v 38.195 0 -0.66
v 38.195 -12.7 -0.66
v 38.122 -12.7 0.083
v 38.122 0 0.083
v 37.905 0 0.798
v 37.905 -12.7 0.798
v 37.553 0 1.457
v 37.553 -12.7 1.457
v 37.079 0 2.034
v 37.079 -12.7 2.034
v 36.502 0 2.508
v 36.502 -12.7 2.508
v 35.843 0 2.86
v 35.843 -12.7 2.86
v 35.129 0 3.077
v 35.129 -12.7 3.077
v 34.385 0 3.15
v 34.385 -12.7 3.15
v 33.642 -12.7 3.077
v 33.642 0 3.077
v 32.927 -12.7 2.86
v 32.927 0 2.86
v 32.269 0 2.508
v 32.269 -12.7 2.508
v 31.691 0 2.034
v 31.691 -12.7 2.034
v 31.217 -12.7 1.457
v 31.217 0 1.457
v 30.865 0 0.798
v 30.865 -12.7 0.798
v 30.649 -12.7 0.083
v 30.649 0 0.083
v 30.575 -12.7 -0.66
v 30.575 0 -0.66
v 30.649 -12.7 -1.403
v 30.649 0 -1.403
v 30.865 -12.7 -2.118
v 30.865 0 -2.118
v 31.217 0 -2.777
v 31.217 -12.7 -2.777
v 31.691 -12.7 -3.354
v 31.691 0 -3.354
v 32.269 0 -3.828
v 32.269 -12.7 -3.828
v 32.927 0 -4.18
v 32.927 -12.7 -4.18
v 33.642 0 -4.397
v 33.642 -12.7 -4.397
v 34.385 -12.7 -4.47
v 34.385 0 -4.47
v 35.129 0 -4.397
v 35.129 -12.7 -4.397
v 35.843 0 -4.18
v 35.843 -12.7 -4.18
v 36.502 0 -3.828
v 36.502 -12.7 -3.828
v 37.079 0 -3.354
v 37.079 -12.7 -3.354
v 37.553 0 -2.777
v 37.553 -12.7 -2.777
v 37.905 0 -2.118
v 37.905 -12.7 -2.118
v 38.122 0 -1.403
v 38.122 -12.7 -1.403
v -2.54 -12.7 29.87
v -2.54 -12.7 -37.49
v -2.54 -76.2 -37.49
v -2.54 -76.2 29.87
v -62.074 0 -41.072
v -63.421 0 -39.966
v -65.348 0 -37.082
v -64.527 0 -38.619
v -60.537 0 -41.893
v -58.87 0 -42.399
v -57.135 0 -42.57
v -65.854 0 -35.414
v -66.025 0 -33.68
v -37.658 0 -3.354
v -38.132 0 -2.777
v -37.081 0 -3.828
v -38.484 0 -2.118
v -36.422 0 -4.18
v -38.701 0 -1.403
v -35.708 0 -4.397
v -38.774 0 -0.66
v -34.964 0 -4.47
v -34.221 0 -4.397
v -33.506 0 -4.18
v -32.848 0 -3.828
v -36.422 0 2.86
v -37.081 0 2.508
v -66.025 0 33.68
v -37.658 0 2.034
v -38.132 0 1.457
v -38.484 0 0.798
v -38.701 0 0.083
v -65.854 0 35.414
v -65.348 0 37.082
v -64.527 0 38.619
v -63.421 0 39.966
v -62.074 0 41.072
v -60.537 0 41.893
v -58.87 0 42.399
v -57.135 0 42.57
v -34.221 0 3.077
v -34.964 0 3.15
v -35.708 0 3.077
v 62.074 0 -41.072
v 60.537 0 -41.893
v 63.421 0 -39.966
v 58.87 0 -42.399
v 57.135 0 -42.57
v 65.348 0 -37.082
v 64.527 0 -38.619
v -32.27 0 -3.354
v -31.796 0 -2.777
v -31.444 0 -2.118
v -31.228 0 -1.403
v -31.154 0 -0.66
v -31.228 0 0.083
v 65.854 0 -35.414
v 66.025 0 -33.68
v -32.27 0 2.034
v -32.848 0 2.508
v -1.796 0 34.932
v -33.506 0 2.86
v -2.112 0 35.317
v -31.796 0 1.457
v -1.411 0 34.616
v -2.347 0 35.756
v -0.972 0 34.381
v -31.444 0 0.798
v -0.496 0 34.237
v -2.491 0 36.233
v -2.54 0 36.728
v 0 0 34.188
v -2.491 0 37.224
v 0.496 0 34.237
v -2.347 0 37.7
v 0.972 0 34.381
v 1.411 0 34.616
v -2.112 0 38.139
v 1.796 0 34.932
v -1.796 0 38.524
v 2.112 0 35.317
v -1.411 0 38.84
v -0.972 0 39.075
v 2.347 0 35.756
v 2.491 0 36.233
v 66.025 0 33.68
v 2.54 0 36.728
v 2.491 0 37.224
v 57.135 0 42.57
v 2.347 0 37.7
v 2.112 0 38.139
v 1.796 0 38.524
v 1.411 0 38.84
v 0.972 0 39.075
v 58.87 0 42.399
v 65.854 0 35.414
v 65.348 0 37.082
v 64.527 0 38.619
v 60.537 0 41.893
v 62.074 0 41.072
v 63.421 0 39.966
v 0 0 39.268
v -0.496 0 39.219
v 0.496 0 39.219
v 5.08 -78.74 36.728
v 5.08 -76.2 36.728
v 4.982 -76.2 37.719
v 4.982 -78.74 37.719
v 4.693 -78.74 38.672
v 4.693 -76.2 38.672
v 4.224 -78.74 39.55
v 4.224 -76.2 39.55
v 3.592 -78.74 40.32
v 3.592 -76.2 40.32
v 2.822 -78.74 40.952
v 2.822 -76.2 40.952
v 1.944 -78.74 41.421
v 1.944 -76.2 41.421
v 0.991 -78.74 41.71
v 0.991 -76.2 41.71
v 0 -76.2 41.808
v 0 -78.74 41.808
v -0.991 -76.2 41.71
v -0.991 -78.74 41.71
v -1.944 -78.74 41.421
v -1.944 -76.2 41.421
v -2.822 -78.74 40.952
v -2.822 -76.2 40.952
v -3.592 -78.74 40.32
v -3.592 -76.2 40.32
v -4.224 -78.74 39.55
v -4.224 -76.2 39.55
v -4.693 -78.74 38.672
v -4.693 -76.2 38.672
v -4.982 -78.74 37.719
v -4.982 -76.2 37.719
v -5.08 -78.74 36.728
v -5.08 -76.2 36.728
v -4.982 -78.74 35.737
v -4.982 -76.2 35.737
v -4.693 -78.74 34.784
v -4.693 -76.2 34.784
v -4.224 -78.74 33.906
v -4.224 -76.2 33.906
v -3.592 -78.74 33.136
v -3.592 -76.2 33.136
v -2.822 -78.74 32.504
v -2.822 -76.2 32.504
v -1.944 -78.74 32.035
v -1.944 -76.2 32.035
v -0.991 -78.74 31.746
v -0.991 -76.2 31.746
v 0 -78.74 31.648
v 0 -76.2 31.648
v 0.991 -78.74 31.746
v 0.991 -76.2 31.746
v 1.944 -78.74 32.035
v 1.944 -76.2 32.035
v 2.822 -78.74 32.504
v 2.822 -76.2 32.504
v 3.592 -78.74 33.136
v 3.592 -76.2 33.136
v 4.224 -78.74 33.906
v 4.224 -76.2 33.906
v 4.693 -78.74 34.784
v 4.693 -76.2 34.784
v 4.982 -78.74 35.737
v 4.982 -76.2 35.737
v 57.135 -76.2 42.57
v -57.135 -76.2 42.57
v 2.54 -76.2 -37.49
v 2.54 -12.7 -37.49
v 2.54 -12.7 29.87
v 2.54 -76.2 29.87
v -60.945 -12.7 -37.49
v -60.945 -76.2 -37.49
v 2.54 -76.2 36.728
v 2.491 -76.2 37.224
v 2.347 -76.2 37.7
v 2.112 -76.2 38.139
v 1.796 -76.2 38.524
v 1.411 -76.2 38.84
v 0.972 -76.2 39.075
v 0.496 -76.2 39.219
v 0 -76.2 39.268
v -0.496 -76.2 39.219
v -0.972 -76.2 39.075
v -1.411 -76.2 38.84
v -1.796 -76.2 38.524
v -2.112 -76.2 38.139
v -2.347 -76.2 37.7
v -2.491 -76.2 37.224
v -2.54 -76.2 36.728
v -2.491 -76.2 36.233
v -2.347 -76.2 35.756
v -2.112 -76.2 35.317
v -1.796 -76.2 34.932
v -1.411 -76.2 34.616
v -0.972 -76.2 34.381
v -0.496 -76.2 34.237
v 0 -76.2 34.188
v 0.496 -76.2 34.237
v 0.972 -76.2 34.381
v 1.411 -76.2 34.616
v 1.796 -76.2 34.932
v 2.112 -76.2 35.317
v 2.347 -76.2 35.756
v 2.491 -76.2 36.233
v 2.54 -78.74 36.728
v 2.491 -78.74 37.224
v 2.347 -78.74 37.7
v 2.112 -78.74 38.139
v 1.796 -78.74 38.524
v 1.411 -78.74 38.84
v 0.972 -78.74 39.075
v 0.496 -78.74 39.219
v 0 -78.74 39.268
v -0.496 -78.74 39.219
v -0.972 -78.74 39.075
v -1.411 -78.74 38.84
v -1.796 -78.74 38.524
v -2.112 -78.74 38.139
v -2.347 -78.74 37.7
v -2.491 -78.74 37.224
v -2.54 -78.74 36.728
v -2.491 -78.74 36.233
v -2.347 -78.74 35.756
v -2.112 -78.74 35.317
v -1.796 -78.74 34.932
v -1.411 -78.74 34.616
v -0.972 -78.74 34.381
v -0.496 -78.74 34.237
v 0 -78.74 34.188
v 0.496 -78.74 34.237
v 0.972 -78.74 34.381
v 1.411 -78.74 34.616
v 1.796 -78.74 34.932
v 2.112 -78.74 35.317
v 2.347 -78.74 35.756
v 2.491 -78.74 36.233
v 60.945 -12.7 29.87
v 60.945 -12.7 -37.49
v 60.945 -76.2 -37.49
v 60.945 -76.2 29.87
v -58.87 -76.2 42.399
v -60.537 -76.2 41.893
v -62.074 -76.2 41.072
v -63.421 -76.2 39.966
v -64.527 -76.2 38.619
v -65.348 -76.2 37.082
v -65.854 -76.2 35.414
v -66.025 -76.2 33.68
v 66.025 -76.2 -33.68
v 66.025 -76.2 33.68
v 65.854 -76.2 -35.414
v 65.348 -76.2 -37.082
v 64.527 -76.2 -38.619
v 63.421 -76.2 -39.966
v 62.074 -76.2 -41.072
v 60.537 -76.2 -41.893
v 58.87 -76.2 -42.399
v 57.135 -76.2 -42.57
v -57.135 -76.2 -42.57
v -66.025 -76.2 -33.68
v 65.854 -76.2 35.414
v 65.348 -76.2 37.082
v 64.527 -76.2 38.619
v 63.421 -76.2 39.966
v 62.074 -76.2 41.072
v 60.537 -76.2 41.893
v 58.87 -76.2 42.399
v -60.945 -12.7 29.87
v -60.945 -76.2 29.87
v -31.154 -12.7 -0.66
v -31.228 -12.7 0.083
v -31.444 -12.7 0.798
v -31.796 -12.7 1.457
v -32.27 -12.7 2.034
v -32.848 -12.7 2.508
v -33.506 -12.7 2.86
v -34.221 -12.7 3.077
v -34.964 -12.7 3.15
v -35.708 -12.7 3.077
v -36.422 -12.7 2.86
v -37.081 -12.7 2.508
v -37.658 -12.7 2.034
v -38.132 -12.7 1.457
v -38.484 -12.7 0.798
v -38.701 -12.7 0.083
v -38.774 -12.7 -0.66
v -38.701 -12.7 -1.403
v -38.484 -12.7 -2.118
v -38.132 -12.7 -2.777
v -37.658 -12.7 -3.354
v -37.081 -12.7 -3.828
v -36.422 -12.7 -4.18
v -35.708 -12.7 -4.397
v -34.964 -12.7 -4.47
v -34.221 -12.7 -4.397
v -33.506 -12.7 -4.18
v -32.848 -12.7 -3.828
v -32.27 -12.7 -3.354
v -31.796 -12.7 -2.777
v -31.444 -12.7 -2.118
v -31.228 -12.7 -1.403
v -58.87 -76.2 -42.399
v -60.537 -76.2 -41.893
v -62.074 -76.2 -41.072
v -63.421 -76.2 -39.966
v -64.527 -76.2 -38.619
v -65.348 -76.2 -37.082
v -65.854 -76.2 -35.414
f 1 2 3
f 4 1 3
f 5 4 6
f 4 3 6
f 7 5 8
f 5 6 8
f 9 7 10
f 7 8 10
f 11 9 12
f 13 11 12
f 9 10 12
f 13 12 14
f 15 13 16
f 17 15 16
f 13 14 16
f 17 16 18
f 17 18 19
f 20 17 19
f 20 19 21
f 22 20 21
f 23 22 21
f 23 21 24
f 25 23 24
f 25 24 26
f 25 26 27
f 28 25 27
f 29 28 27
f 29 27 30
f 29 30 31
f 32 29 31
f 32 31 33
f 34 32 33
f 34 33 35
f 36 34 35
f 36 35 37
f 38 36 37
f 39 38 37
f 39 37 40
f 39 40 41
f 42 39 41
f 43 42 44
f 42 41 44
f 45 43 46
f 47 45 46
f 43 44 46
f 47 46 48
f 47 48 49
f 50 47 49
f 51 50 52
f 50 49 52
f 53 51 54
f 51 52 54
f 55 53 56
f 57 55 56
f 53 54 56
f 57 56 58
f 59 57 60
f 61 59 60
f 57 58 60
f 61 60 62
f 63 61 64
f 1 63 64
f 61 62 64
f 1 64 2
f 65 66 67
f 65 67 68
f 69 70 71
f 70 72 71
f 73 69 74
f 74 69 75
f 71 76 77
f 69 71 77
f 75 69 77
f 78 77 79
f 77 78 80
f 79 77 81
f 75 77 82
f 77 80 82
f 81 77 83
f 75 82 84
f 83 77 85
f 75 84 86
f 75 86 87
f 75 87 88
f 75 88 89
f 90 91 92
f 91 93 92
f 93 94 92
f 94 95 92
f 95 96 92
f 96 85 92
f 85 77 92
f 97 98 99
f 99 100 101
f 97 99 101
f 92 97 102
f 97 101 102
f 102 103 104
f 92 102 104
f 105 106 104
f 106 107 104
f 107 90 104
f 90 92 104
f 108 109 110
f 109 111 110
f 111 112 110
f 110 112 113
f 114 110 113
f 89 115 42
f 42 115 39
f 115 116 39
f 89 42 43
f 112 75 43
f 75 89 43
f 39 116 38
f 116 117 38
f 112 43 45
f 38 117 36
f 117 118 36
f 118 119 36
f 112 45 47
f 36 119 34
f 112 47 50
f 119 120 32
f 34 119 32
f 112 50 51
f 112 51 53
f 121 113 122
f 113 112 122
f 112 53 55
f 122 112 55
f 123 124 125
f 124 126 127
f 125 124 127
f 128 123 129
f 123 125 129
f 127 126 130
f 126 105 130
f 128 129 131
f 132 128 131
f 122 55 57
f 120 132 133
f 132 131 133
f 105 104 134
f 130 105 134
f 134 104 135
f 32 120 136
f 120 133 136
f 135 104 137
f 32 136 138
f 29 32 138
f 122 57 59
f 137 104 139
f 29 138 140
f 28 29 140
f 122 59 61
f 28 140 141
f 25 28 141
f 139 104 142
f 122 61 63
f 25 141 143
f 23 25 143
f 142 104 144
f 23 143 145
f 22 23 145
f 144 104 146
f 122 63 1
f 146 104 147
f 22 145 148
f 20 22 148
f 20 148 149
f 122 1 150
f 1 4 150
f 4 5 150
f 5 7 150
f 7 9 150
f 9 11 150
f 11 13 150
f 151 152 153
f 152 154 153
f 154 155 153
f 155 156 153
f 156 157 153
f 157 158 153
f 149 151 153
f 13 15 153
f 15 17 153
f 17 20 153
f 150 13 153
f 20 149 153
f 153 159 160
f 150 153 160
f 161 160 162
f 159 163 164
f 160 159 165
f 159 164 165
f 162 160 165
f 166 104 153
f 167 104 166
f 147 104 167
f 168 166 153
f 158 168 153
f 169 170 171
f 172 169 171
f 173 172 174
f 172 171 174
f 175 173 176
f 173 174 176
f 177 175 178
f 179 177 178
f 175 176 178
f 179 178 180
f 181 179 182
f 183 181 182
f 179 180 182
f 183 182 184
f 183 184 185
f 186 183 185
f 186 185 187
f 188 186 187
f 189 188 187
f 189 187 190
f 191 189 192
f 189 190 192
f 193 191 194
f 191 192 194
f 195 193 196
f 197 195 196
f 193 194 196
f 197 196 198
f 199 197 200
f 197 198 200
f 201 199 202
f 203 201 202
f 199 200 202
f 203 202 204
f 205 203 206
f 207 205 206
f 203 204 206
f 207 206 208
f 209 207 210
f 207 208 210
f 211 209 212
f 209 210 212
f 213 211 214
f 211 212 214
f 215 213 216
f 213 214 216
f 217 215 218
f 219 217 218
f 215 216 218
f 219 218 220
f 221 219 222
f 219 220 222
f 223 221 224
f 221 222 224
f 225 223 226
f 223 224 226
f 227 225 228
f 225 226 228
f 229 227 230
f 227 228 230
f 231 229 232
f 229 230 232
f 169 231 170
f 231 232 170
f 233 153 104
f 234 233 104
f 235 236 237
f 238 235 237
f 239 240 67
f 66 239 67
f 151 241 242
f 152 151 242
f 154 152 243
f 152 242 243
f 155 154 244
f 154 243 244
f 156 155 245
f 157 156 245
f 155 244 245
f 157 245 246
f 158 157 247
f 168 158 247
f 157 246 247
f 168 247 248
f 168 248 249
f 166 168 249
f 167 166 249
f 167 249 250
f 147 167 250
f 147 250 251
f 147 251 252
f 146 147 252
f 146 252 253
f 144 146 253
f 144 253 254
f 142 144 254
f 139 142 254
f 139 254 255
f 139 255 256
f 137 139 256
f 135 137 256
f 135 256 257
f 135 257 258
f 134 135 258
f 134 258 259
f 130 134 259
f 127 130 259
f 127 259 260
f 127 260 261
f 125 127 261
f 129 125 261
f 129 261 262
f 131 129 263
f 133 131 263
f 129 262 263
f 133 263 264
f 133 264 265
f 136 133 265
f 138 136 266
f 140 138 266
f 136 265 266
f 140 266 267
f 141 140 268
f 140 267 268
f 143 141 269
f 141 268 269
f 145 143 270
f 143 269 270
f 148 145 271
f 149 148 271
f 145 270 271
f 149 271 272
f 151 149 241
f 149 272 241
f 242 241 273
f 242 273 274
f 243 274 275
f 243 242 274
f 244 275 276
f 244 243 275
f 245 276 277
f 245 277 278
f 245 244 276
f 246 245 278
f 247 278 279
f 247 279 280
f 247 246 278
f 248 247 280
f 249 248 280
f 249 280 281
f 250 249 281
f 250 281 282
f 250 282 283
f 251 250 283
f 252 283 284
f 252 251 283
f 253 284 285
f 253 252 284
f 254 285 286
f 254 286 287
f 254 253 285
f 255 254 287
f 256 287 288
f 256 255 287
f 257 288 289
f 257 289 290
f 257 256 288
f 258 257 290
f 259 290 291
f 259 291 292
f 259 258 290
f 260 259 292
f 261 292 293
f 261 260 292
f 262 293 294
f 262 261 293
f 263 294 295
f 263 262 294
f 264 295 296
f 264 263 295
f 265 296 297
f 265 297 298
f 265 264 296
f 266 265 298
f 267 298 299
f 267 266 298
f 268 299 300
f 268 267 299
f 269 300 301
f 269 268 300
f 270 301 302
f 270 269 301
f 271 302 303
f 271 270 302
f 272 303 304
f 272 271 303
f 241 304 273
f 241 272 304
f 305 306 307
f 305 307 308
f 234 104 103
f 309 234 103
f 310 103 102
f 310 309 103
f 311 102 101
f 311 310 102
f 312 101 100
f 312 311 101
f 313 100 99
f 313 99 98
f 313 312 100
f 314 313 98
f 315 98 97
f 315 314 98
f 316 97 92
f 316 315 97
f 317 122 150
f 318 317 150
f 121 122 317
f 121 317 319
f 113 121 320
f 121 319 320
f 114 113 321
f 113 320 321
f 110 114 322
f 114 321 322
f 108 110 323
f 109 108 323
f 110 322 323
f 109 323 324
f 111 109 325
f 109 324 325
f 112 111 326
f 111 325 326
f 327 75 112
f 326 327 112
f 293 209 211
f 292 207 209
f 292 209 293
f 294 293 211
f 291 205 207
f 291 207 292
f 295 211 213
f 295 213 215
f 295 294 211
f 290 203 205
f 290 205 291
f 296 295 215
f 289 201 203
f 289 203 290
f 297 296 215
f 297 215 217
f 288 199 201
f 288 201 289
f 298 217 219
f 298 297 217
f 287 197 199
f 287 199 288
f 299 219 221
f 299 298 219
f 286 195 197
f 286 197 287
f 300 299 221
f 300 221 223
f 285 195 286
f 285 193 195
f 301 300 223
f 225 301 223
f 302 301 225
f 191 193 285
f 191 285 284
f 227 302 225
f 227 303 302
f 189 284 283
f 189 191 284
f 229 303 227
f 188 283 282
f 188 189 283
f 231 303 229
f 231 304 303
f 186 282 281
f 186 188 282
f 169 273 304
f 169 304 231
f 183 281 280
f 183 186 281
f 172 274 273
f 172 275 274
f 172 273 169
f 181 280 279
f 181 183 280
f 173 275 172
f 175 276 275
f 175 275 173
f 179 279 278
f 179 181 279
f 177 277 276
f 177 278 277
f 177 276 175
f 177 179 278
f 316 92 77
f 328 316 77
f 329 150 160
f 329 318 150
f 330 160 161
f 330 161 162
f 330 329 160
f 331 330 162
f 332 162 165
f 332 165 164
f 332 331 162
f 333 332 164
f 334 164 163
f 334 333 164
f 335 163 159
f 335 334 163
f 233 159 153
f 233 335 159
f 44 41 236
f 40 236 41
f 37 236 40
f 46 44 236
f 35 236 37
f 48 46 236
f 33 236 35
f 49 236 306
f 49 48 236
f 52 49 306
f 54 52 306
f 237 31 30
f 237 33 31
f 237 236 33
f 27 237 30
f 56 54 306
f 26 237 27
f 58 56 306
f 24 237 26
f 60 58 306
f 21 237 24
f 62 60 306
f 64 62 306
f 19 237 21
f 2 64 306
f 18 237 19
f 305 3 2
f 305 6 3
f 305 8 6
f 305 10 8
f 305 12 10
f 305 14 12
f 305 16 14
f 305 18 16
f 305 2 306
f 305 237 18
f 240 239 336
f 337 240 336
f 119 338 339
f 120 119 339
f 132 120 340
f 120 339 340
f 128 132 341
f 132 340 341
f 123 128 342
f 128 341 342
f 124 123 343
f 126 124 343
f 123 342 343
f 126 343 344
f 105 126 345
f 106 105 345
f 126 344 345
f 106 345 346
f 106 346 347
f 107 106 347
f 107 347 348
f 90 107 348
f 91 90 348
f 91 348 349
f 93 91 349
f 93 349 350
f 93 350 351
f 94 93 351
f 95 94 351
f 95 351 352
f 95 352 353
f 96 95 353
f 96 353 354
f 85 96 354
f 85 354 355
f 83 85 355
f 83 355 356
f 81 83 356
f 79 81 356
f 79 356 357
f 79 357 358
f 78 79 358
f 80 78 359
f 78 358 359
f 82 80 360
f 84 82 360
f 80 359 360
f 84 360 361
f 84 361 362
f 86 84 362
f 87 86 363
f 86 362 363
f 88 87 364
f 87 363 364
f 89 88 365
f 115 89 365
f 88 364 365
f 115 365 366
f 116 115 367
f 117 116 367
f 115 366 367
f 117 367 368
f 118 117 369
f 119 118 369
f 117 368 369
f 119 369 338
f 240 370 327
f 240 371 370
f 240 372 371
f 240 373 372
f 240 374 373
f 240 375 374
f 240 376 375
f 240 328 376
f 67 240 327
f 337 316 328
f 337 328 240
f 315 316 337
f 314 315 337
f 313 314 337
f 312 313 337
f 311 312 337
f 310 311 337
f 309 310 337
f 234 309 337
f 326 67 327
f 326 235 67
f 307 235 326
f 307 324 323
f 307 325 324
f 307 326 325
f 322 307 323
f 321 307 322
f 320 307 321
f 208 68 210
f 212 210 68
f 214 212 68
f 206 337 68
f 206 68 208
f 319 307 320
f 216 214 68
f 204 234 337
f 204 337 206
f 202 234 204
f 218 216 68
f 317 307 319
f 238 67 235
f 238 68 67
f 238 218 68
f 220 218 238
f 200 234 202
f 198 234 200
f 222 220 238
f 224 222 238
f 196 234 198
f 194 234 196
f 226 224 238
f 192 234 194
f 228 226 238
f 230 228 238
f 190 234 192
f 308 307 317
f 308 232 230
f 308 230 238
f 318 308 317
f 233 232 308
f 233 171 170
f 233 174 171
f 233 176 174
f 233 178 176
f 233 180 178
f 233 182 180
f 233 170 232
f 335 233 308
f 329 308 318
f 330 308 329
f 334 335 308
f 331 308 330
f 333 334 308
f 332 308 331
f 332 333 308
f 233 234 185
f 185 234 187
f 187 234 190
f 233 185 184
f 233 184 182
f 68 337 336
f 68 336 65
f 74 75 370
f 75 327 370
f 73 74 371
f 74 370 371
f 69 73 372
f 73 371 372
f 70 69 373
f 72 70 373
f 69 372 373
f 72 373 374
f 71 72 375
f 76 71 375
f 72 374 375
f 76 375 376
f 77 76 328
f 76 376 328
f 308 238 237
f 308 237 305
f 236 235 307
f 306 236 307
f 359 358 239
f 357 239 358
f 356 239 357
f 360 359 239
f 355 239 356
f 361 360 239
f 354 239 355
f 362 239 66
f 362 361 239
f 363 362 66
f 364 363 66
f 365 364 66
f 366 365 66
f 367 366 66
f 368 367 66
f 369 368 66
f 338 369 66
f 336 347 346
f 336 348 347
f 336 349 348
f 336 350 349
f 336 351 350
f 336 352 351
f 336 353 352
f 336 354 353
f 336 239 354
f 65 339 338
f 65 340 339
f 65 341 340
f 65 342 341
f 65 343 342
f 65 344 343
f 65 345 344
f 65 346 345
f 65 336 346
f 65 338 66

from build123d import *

# Parameters (mm, degrees)
F0_W     = 58.405198
F0_H     = 67.360154
F1_DEPTH = 76.2
F2_DEPTH = 12.7
F3_R     = 8.89
F4_R     = 3.81
F5_DEPTH = 25.4
F6_R     = 2.54
F7_DEPTH = 76.201
F6_R_2   = 5.08
F8_DEPTH = 2.54


with BuildPart() as f1:
    # F0 (on Front) → F1 (new body)
    with BuildSketch(Plane.XZ):
        Polygon((66.025198, -42.570077), (66.025198, 42.570077), (2.54, 42.570077), (-2.54, 42.570077), (-66.025198, 42.570077), (-66.025198, -42.570077), (-2.54, -42.570077), (2.54, -42.570077), align=None)
        with Locations((-31.742599, -3.81)):
            Rectangle(F0_W, F0_H, mode=Mode.SUBTRACT)
        with Locations((31.742599, -3.81)):
            Rectangle(F0_W, F0_H, mode=Mode.SUBTRACT)
    extrude(amount=F1_DEPTH)

    # F0 (on Front) → F2 (join)
    with BuildSketch(Plane.XZ):
        with Locations((-31.742599, -3.81)):
            Rectangle(F0_W, F0_H)
        with Locations((31.742599, -3.81)):
            Rectangle(F0_W, F0_H)
    extrude(amount=F2_DEPTH)

    # F3
    f3_edges = [f1.edges().sort_by_distance(p)[0] for p in [
        (66.025198, -38.1, 42.570077),
        (-66.025198, -38.1, -42.570077),
        (66.025198, -38.1, -42.570077),
        (-66.025198, -38.1, 42.570077),
    ]]
    fillet(f3_edges, radius=F3_R)

    # F4 (on face) → F5 (cut)
    with BuildSketch(Plane.XZ.offset(12.7)):
        with Locations((-34.964384, -0.660077)):
            Circle(F4_R)
        with Locations((34.385315, -0.660077)):
            Circle(F4_R)
    extrude(amount=-F5_DEPTH, mode=Mode.SUBTRACT)

    # F6 (on face) → F7 (cut, through all)
    with BuildSketch(Plane.XZ.offset(76.2)):
        with Locations((0, 36.728077)):
            Circle(F6_R)
    extrude(amount=-F7_DEPTH, mode=Mode.SUBTRACT)

    # F6 (on face) → F8 (join)
    with BuildSketch(Plane.XZ.offset(76.2)):
        with Locations((0, 36.728077)):
            Circle(F6_R_2)
        with Locations((0, 36.728077)):
            Circle(F6_R, mode=Mode.SUBTRACT)
    extrude(amount=F8_DEPTH)


solid = f1.part
